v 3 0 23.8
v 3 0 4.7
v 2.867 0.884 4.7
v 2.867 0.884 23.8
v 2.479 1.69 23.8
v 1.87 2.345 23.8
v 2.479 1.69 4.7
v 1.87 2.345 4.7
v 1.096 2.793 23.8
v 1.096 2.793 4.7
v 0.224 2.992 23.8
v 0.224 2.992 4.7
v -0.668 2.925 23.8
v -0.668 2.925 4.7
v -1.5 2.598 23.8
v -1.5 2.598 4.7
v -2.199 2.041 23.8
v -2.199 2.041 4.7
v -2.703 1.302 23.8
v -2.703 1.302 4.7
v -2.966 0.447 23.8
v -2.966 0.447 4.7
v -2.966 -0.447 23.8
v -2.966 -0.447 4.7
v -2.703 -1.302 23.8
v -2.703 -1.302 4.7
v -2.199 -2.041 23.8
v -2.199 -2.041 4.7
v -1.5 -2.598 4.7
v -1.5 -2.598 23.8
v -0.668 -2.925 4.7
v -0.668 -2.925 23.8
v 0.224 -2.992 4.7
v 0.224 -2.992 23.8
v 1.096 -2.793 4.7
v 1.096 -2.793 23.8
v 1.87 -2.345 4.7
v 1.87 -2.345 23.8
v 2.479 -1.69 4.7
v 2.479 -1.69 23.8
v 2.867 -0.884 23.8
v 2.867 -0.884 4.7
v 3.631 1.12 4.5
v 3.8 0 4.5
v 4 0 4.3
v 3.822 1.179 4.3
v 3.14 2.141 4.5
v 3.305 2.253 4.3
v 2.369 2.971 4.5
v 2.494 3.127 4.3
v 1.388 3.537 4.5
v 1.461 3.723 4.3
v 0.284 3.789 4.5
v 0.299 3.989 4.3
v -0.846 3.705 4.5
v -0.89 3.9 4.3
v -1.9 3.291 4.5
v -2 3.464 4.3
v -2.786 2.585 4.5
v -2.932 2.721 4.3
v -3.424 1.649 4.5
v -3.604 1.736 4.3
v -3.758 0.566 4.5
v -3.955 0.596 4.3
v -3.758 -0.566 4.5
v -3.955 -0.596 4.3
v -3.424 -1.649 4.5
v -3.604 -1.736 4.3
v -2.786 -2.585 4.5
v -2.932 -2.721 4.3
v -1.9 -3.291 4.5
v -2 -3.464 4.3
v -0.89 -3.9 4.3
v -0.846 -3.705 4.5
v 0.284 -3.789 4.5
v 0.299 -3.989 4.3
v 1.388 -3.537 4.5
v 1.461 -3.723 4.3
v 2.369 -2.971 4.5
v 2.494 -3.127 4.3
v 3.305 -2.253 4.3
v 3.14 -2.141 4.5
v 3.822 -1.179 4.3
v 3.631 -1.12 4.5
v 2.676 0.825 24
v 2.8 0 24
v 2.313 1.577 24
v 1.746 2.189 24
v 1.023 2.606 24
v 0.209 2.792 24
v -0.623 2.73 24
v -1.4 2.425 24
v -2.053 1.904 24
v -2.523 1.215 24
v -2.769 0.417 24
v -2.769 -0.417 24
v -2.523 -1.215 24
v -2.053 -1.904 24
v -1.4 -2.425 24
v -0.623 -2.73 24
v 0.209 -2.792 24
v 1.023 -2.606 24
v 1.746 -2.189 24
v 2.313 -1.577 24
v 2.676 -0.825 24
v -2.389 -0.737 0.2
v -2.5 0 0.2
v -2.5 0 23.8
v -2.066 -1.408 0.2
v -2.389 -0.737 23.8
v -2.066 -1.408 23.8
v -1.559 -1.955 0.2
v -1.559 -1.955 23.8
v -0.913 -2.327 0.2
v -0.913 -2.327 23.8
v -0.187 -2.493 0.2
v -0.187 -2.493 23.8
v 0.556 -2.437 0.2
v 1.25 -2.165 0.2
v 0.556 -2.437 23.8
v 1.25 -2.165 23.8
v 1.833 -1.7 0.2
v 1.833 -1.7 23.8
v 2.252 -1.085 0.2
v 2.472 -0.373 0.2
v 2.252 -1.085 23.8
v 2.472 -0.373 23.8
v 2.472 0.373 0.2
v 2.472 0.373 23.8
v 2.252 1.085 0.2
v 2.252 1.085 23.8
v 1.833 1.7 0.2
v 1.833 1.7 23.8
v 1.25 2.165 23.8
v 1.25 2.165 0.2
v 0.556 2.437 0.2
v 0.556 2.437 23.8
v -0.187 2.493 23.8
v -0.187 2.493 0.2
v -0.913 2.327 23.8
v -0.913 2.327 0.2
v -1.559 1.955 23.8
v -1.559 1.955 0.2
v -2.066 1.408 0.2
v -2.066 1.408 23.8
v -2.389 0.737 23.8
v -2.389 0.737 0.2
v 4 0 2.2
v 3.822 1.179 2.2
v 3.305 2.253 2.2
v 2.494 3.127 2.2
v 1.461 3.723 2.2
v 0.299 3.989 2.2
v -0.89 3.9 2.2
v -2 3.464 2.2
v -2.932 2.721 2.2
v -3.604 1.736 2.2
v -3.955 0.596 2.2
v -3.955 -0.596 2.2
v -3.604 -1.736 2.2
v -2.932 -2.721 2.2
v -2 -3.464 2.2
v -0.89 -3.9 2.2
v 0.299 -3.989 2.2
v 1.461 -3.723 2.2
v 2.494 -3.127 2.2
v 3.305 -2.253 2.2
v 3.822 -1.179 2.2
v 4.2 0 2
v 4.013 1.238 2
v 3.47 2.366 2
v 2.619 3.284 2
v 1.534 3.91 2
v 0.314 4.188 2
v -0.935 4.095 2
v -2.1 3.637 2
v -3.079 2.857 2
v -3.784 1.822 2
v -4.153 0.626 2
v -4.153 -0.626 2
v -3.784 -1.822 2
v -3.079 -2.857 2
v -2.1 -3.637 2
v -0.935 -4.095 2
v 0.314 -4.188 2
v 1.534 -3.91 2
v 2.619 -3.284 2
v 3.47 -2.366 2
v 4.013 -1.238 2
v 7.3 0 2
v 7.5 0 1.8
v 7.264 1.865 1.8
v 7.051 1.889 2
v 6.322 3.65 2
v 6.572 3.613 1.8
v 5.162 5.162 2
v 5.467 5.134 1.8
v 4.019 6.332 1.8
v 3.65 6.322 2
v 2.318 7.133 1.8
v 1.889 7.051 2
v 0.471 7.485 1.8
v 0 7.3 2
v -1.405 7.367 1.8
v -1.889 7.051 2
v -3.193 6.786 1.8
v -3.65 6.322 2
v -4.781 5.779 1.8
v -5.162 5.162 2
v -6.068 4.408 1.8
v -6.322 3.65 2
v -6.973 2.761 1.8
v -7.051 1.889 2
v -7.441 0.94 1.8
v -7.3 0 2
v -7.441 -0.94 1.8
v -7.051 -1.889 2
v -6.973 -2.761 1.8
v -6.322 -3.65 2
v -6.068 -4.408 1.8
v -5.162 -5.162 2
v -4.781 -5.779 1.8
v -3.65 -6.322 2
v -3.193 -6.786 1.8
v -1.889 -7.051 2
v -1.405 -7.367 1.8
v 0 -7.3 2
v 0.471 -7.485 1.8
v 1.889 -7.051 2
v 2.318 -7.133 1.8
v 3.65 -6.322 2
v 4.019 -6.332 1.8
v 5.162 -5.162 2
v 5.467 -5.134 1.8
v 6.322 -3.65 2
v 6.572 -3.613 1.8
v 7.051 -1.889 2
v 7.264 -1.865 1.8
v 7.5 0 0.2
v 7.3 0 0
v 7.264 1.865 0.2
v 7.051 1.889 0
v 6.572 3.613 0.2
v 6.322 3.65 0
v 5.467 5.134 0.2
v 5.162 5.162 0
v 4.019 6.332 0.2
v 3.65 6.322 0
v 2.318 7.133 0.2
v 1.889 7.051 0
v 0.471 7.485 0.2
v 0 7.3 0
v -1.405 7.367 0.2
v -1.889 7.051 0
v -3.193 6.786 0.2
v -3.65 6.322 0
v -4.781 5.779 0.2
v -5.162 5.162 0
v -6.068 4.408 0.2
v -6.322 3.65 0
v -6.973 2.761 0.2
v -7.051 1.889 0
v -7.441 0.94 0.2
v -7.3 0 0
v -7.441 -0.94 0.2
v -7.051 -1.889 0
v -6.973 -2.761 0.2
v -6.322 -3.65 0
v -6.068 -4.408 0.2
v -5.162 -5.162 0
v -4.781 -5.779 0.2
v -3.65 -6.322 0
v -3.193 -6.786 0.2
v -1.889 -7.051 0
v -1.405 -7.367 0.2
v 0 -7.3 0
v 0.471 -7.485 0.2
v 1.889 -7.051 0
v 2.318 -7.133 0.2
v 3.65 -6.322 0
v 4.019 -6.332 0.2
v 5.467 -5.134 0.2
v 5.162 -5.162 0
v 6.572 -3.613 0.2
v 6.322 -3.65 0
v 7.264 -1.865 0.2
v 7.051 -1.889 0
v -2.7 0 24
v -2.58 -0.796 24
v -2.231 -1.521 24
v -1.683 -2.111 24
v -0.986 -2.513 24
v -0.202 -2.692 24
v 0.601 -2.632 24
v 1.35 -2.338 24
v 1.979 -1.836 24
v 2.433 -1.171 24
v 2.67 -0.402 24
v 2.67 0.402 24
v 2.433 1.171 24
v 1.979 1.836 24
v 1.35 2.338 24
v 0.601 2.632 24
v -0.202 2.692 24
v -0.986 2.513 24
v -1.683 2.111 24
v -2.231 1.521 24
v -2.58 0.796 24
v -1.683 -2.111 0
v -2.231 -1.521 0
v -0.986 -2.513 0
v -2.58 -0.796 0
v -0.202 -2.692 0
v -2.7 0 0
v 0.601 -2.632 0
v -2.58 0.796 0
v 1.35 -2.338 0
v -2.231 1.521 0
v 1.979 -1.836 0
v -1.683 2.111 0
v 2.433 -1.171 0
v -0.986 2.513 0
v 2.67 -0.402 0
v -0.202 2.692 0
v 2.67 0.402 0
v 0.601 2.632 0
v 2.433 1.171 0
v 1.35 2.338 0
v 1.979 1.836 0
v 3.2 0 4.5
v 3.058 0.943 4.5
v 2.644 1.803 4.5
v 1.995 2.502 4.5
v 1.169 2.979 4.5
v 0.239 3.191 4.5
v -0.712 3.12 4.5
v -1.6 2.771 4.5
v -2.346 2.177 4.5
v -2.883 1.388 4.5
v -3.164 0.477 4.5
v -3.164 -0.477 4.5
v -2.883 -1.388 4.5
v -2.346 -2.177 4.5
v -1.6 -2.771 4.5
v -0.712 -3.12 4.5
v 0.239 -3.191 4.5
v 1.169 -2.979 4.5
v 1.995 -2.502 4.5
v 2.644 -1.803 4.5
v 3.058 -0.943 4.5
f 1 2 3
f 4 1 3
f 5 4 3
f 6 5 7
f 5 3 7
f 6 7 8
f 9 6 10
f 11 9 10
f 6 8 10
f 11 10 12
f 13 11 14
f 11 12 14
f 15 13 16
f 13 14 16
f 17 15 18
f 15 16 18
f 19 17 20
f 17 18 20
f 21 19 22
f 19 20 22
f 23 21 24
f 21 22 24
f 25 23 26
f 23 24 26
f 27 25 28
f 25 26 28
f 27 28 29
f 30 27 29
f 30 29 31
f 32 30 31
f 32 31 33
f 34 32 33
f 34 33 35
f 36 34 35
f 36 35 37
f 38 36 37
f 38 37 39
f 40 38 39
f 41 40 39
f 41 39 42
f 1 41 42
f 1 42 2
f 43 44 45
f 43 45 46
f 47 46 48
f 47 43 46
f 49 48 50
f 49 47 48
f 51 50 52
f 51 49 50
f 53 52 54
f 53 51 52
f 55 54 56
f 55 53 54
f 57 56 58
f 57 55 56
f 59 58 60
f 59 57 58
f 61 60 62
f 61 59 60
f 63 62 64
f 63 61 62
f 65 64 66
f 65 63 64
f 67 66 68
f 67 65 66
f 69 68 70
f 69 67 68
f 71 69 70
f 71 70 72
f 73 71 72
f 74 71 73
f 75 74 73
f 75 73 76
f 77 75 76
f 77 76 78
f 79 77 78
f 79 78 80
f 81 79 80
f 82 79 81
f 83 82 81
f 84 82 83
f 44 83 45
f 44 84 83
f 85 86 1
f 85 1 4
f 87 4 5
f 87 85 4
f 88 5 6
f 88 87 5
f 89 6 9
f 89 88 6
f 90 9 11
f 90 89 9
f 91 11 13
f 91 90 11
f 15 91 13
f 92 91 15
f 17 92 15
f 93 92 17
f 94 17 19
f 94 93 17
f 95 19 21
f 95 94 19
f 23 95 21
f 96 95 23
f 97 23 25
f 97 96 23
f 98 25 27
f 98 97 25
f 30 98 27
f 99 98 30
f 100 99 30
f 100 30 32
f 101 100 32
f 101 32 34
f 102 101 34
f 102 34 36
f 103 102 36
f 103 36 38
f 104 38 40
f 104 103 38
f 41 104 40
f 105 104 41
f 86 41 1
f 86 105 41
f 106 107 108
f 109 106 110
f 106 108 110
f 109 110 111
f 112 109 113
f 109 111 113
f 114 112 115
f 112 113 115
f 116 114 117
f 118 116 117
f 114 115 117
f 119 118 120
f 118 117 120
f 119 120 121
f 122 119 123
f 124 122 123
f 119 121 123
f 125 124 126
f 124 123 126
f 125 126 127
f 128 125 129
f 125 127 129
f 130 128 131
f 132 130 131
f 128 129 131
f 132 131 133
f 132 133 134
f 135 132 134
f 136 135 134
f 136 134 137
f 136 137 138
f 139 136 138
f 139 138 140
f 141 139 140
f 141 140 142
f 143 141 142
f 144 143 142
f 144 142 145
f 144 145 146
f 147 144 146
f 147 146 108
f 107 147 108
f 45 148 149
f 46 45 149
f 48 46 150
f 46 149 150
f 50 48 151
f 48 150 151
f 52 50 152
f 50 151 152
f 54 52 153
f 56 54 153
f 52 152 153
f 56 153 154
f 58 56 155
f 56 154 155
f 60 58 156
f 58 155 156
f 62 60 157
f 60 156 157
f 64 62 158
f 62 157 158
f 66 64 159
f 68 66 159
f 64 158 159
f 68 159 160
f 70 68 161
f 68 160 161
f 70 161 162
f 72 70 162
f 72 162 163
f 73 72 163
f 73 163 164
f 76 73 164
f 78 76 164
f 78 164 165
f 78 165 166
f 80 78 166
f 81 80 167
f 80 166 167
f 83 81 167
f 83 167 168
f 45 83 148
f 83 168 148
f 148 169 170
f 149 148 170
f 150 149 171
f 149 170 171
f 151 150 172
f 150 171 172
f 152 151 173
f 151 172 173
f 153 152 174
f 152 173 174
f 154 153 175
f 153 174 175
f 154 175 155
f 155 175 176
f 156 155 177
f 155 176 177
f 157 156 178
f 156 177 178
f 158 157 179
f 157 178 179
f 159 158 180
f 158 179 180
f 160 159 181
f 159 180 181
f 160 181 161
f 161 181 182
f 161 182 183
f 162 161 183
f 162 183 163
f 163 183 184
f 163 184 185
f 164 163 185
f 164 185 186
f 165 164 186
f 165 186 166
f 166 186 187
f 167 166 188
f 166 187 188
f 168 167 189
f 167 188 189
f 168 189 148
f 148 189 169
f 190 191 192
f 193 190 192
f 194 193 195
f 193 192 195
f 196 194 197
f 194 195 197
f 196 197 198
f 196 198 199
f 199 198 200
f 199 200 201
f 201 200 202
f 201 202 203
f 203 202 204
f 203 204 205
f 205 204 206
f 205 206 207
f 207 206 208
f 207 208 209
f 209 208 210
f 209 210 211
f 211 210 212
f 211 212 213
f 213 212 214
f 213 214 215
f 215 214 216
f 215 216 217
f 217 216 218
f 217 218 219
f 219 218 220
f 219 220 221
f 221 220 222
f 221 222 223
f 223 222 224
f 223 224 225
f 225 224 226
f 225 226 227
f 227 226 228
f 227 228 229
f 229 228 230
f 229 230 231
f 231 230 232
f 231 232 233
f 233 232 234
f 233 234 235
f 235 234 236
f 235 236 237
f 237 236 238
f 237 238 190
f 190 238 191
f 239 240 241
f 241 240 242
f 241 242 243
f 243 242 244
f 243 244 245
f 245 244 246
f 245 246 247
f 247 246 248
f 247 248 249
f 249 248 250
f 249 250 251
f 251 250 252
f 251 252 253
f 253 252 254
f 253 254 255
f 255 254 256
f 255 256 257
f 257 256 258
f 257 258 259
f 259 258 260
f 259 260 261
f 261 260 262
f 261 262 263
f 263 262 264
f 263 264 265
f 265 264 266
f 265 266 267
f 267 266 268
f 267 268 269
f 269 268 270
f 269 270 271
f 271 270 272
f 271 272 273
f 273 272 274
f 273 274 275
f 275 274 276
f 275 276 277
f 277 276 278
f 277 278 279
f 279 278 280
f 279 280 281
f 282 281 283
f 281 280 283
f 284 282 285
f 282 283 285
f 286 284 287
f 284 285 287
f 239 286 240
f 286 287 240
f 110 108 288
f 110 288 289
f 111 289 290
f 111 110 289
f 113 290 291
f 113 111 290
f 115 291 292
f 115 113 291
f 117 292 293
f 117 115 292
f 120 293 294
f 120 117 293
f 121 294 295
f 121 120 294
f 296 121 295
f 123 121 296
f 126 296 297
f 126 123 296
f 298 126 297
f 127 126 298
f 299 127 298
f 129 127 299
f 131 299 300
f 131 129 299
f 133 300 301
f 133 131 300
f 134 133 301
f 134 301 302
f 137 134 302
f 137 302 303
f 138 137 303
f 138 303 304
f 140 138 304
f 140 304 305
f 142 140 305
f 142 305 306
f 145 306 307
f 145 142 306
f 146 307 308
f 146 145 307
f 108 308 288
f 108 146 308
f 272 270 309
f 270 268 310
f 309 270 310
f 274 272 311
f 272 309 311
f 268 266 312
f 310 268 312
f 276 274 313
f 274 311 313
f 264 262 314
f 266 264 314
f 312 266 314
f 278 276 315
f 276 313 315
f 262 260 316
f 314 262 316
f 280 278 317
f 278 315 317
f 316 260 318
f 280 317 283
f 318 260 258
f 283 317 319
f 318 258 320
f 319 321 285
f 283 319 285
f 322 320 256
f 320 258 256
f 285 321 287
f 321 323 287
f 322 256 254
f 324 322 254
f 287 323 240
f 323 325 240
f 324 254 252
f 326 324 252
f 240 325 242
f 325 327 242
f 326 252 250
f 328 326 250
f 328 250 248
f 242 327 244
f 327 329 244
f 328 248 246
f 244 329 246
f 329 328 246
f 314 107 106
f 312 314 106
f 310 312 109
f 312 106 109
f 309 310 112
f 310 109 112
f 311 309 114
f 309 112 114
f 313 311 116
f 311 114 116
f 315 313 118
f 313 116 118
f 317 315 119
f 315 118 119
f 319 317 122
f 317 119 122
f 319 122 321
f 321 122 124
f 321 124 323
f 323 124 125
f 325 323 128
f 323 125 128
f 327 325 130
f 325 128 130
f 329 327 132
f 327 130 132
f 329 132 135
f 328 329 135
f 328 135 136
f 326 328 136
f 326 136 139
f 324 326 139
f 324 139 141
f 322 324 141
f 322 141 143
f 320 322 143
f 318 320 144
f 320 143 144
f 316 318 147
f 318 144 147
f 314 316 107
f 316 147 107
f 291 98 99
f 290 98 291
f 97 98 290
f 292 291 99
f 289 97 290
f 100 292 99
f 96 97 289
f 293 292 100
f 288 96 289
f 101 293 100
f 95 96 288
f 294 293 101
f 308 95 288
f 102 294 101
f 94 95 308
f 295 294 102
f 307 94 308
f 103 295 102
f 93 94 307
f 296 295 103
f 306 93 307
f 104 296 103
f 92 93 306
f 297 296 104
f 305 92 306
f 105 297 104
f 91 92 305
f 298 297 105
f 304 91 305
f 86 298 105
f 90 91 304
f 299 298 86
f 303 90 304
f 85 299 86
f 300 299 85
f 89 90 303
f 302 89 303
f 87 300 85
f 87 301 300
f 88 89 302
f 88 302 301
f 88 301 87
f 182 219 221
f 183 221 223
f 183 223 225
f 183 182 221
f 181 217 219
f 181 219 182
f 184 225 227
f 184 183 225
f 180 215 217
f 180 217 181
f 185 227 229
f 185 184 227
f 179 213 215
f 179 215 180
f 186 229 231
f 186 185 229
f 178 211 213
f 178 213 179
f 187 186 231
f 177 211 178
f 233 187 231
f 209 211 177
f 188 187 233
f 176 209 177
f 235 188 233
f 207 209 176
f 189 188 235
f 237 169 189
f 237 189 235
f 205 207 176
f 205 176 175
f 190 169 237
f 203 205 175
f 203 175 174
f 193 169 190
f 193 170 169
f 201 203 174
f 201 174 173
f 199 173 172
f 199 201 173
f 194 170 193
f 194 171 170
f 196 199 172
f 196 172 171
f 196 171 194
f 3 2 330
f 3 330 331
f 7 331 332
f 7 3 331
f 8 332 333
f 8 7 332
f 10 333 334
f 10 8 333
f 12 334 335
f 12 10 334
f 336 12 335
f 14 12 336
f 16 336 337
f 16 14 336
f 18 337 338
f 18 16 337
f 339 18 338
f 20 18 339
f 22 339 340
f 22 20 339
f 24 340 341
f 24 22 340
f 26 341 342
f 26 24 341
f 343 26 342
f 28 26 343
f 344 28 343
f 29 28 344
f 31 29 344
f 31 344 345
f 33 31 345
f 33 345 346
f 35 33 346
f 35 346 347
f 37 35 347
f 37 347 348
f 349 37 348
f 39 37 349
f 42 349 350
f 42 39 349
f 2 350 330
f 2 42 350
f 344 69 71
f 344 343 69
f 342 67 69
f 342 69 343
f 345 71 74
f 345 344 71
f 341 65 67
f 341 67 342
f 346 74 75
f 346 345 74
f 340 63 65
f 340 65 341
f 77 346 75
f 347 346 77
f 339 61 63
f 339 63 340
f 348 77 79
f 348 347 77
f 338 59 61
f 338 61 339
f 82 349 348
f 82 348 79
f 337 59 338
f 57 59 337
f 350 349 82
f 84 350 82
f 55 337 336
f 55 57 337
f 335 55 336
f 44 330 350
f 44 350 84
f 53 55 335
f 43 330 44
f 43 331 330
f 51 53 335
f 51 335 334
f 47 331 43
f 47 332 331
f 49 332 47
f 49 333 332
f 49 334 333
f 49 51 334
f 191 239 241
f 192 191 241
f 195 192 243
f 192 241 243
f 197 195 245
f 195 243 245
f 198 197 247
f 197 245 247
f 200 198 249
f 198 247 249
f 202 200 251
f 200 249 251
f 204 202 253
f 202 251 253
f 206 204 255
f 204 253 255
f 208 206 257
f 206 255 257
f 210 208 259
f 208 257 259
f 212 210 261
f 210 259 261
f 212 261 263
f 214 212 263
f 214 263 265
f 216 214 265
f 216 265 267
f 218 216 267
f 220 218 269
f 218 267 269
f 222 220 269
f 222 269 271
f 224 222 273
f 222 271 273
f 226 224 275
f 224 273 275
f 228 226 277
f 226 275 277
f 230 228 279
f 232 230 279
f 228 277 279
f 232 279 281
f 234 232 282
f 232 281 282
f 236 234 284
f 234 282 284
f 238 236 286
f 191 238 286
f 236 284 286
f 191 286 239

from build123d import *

# Parameters (mm, degrees)
F0_R     = 7.5
F1_DEPTH = 2
F2_R     = 3
F3_DEPTH = 22
F5_D     = 5
F6_R     = 4
F6_R_2   = 3
F7_DEPTH = 2.5
F8_SIZE  = 0.2


with BuildPart() as f1:
    # F0 (on Top) → F1 (new body)
    with BuildSketch(Plane.XY):
        Circle(F0_R)
    extrude(amount=F1_DEPTH)

    # F2 (on face) → F3 (join)
    with BuildSketch(Plane.XY.offset(2)):
        Circle(F2_R)
    extrude(amount=F3_DEPTH)

    # F5 (through all)
    with Locations(Plane(origin=(0, 0, 0), x_dir=(1, 0, 0), z_dir=(0, 0, -1))):
        with Locations((0, 0)):
            Hole(F5_D / 2)

    # F6 (on face) → F7 (join)
    with BuildSketch(Plane.XY.offset(2)):
        Circle(F6_R)
        Circle(F6_R_2, mode=Mode.SUBTRACT)
    extrude(amount=F7_DEPTH)

    # F8
    f8_edges = [f1.edges().sort_by_distance(p)[0] for p in [
        (-3, 0, 24),
        (-7.5, 0, 2),
        (-7.5, 0, 0),
        (-3, 0, 4.5),
        (-4, 0, 4.5),
        (-4, 0, 2),
        (-2.5, 0, 0),
        (-2.5, 0, 24),
    ]]
    chamfer(f8_edges, length=F8_SIZE)


solid = f1.part
